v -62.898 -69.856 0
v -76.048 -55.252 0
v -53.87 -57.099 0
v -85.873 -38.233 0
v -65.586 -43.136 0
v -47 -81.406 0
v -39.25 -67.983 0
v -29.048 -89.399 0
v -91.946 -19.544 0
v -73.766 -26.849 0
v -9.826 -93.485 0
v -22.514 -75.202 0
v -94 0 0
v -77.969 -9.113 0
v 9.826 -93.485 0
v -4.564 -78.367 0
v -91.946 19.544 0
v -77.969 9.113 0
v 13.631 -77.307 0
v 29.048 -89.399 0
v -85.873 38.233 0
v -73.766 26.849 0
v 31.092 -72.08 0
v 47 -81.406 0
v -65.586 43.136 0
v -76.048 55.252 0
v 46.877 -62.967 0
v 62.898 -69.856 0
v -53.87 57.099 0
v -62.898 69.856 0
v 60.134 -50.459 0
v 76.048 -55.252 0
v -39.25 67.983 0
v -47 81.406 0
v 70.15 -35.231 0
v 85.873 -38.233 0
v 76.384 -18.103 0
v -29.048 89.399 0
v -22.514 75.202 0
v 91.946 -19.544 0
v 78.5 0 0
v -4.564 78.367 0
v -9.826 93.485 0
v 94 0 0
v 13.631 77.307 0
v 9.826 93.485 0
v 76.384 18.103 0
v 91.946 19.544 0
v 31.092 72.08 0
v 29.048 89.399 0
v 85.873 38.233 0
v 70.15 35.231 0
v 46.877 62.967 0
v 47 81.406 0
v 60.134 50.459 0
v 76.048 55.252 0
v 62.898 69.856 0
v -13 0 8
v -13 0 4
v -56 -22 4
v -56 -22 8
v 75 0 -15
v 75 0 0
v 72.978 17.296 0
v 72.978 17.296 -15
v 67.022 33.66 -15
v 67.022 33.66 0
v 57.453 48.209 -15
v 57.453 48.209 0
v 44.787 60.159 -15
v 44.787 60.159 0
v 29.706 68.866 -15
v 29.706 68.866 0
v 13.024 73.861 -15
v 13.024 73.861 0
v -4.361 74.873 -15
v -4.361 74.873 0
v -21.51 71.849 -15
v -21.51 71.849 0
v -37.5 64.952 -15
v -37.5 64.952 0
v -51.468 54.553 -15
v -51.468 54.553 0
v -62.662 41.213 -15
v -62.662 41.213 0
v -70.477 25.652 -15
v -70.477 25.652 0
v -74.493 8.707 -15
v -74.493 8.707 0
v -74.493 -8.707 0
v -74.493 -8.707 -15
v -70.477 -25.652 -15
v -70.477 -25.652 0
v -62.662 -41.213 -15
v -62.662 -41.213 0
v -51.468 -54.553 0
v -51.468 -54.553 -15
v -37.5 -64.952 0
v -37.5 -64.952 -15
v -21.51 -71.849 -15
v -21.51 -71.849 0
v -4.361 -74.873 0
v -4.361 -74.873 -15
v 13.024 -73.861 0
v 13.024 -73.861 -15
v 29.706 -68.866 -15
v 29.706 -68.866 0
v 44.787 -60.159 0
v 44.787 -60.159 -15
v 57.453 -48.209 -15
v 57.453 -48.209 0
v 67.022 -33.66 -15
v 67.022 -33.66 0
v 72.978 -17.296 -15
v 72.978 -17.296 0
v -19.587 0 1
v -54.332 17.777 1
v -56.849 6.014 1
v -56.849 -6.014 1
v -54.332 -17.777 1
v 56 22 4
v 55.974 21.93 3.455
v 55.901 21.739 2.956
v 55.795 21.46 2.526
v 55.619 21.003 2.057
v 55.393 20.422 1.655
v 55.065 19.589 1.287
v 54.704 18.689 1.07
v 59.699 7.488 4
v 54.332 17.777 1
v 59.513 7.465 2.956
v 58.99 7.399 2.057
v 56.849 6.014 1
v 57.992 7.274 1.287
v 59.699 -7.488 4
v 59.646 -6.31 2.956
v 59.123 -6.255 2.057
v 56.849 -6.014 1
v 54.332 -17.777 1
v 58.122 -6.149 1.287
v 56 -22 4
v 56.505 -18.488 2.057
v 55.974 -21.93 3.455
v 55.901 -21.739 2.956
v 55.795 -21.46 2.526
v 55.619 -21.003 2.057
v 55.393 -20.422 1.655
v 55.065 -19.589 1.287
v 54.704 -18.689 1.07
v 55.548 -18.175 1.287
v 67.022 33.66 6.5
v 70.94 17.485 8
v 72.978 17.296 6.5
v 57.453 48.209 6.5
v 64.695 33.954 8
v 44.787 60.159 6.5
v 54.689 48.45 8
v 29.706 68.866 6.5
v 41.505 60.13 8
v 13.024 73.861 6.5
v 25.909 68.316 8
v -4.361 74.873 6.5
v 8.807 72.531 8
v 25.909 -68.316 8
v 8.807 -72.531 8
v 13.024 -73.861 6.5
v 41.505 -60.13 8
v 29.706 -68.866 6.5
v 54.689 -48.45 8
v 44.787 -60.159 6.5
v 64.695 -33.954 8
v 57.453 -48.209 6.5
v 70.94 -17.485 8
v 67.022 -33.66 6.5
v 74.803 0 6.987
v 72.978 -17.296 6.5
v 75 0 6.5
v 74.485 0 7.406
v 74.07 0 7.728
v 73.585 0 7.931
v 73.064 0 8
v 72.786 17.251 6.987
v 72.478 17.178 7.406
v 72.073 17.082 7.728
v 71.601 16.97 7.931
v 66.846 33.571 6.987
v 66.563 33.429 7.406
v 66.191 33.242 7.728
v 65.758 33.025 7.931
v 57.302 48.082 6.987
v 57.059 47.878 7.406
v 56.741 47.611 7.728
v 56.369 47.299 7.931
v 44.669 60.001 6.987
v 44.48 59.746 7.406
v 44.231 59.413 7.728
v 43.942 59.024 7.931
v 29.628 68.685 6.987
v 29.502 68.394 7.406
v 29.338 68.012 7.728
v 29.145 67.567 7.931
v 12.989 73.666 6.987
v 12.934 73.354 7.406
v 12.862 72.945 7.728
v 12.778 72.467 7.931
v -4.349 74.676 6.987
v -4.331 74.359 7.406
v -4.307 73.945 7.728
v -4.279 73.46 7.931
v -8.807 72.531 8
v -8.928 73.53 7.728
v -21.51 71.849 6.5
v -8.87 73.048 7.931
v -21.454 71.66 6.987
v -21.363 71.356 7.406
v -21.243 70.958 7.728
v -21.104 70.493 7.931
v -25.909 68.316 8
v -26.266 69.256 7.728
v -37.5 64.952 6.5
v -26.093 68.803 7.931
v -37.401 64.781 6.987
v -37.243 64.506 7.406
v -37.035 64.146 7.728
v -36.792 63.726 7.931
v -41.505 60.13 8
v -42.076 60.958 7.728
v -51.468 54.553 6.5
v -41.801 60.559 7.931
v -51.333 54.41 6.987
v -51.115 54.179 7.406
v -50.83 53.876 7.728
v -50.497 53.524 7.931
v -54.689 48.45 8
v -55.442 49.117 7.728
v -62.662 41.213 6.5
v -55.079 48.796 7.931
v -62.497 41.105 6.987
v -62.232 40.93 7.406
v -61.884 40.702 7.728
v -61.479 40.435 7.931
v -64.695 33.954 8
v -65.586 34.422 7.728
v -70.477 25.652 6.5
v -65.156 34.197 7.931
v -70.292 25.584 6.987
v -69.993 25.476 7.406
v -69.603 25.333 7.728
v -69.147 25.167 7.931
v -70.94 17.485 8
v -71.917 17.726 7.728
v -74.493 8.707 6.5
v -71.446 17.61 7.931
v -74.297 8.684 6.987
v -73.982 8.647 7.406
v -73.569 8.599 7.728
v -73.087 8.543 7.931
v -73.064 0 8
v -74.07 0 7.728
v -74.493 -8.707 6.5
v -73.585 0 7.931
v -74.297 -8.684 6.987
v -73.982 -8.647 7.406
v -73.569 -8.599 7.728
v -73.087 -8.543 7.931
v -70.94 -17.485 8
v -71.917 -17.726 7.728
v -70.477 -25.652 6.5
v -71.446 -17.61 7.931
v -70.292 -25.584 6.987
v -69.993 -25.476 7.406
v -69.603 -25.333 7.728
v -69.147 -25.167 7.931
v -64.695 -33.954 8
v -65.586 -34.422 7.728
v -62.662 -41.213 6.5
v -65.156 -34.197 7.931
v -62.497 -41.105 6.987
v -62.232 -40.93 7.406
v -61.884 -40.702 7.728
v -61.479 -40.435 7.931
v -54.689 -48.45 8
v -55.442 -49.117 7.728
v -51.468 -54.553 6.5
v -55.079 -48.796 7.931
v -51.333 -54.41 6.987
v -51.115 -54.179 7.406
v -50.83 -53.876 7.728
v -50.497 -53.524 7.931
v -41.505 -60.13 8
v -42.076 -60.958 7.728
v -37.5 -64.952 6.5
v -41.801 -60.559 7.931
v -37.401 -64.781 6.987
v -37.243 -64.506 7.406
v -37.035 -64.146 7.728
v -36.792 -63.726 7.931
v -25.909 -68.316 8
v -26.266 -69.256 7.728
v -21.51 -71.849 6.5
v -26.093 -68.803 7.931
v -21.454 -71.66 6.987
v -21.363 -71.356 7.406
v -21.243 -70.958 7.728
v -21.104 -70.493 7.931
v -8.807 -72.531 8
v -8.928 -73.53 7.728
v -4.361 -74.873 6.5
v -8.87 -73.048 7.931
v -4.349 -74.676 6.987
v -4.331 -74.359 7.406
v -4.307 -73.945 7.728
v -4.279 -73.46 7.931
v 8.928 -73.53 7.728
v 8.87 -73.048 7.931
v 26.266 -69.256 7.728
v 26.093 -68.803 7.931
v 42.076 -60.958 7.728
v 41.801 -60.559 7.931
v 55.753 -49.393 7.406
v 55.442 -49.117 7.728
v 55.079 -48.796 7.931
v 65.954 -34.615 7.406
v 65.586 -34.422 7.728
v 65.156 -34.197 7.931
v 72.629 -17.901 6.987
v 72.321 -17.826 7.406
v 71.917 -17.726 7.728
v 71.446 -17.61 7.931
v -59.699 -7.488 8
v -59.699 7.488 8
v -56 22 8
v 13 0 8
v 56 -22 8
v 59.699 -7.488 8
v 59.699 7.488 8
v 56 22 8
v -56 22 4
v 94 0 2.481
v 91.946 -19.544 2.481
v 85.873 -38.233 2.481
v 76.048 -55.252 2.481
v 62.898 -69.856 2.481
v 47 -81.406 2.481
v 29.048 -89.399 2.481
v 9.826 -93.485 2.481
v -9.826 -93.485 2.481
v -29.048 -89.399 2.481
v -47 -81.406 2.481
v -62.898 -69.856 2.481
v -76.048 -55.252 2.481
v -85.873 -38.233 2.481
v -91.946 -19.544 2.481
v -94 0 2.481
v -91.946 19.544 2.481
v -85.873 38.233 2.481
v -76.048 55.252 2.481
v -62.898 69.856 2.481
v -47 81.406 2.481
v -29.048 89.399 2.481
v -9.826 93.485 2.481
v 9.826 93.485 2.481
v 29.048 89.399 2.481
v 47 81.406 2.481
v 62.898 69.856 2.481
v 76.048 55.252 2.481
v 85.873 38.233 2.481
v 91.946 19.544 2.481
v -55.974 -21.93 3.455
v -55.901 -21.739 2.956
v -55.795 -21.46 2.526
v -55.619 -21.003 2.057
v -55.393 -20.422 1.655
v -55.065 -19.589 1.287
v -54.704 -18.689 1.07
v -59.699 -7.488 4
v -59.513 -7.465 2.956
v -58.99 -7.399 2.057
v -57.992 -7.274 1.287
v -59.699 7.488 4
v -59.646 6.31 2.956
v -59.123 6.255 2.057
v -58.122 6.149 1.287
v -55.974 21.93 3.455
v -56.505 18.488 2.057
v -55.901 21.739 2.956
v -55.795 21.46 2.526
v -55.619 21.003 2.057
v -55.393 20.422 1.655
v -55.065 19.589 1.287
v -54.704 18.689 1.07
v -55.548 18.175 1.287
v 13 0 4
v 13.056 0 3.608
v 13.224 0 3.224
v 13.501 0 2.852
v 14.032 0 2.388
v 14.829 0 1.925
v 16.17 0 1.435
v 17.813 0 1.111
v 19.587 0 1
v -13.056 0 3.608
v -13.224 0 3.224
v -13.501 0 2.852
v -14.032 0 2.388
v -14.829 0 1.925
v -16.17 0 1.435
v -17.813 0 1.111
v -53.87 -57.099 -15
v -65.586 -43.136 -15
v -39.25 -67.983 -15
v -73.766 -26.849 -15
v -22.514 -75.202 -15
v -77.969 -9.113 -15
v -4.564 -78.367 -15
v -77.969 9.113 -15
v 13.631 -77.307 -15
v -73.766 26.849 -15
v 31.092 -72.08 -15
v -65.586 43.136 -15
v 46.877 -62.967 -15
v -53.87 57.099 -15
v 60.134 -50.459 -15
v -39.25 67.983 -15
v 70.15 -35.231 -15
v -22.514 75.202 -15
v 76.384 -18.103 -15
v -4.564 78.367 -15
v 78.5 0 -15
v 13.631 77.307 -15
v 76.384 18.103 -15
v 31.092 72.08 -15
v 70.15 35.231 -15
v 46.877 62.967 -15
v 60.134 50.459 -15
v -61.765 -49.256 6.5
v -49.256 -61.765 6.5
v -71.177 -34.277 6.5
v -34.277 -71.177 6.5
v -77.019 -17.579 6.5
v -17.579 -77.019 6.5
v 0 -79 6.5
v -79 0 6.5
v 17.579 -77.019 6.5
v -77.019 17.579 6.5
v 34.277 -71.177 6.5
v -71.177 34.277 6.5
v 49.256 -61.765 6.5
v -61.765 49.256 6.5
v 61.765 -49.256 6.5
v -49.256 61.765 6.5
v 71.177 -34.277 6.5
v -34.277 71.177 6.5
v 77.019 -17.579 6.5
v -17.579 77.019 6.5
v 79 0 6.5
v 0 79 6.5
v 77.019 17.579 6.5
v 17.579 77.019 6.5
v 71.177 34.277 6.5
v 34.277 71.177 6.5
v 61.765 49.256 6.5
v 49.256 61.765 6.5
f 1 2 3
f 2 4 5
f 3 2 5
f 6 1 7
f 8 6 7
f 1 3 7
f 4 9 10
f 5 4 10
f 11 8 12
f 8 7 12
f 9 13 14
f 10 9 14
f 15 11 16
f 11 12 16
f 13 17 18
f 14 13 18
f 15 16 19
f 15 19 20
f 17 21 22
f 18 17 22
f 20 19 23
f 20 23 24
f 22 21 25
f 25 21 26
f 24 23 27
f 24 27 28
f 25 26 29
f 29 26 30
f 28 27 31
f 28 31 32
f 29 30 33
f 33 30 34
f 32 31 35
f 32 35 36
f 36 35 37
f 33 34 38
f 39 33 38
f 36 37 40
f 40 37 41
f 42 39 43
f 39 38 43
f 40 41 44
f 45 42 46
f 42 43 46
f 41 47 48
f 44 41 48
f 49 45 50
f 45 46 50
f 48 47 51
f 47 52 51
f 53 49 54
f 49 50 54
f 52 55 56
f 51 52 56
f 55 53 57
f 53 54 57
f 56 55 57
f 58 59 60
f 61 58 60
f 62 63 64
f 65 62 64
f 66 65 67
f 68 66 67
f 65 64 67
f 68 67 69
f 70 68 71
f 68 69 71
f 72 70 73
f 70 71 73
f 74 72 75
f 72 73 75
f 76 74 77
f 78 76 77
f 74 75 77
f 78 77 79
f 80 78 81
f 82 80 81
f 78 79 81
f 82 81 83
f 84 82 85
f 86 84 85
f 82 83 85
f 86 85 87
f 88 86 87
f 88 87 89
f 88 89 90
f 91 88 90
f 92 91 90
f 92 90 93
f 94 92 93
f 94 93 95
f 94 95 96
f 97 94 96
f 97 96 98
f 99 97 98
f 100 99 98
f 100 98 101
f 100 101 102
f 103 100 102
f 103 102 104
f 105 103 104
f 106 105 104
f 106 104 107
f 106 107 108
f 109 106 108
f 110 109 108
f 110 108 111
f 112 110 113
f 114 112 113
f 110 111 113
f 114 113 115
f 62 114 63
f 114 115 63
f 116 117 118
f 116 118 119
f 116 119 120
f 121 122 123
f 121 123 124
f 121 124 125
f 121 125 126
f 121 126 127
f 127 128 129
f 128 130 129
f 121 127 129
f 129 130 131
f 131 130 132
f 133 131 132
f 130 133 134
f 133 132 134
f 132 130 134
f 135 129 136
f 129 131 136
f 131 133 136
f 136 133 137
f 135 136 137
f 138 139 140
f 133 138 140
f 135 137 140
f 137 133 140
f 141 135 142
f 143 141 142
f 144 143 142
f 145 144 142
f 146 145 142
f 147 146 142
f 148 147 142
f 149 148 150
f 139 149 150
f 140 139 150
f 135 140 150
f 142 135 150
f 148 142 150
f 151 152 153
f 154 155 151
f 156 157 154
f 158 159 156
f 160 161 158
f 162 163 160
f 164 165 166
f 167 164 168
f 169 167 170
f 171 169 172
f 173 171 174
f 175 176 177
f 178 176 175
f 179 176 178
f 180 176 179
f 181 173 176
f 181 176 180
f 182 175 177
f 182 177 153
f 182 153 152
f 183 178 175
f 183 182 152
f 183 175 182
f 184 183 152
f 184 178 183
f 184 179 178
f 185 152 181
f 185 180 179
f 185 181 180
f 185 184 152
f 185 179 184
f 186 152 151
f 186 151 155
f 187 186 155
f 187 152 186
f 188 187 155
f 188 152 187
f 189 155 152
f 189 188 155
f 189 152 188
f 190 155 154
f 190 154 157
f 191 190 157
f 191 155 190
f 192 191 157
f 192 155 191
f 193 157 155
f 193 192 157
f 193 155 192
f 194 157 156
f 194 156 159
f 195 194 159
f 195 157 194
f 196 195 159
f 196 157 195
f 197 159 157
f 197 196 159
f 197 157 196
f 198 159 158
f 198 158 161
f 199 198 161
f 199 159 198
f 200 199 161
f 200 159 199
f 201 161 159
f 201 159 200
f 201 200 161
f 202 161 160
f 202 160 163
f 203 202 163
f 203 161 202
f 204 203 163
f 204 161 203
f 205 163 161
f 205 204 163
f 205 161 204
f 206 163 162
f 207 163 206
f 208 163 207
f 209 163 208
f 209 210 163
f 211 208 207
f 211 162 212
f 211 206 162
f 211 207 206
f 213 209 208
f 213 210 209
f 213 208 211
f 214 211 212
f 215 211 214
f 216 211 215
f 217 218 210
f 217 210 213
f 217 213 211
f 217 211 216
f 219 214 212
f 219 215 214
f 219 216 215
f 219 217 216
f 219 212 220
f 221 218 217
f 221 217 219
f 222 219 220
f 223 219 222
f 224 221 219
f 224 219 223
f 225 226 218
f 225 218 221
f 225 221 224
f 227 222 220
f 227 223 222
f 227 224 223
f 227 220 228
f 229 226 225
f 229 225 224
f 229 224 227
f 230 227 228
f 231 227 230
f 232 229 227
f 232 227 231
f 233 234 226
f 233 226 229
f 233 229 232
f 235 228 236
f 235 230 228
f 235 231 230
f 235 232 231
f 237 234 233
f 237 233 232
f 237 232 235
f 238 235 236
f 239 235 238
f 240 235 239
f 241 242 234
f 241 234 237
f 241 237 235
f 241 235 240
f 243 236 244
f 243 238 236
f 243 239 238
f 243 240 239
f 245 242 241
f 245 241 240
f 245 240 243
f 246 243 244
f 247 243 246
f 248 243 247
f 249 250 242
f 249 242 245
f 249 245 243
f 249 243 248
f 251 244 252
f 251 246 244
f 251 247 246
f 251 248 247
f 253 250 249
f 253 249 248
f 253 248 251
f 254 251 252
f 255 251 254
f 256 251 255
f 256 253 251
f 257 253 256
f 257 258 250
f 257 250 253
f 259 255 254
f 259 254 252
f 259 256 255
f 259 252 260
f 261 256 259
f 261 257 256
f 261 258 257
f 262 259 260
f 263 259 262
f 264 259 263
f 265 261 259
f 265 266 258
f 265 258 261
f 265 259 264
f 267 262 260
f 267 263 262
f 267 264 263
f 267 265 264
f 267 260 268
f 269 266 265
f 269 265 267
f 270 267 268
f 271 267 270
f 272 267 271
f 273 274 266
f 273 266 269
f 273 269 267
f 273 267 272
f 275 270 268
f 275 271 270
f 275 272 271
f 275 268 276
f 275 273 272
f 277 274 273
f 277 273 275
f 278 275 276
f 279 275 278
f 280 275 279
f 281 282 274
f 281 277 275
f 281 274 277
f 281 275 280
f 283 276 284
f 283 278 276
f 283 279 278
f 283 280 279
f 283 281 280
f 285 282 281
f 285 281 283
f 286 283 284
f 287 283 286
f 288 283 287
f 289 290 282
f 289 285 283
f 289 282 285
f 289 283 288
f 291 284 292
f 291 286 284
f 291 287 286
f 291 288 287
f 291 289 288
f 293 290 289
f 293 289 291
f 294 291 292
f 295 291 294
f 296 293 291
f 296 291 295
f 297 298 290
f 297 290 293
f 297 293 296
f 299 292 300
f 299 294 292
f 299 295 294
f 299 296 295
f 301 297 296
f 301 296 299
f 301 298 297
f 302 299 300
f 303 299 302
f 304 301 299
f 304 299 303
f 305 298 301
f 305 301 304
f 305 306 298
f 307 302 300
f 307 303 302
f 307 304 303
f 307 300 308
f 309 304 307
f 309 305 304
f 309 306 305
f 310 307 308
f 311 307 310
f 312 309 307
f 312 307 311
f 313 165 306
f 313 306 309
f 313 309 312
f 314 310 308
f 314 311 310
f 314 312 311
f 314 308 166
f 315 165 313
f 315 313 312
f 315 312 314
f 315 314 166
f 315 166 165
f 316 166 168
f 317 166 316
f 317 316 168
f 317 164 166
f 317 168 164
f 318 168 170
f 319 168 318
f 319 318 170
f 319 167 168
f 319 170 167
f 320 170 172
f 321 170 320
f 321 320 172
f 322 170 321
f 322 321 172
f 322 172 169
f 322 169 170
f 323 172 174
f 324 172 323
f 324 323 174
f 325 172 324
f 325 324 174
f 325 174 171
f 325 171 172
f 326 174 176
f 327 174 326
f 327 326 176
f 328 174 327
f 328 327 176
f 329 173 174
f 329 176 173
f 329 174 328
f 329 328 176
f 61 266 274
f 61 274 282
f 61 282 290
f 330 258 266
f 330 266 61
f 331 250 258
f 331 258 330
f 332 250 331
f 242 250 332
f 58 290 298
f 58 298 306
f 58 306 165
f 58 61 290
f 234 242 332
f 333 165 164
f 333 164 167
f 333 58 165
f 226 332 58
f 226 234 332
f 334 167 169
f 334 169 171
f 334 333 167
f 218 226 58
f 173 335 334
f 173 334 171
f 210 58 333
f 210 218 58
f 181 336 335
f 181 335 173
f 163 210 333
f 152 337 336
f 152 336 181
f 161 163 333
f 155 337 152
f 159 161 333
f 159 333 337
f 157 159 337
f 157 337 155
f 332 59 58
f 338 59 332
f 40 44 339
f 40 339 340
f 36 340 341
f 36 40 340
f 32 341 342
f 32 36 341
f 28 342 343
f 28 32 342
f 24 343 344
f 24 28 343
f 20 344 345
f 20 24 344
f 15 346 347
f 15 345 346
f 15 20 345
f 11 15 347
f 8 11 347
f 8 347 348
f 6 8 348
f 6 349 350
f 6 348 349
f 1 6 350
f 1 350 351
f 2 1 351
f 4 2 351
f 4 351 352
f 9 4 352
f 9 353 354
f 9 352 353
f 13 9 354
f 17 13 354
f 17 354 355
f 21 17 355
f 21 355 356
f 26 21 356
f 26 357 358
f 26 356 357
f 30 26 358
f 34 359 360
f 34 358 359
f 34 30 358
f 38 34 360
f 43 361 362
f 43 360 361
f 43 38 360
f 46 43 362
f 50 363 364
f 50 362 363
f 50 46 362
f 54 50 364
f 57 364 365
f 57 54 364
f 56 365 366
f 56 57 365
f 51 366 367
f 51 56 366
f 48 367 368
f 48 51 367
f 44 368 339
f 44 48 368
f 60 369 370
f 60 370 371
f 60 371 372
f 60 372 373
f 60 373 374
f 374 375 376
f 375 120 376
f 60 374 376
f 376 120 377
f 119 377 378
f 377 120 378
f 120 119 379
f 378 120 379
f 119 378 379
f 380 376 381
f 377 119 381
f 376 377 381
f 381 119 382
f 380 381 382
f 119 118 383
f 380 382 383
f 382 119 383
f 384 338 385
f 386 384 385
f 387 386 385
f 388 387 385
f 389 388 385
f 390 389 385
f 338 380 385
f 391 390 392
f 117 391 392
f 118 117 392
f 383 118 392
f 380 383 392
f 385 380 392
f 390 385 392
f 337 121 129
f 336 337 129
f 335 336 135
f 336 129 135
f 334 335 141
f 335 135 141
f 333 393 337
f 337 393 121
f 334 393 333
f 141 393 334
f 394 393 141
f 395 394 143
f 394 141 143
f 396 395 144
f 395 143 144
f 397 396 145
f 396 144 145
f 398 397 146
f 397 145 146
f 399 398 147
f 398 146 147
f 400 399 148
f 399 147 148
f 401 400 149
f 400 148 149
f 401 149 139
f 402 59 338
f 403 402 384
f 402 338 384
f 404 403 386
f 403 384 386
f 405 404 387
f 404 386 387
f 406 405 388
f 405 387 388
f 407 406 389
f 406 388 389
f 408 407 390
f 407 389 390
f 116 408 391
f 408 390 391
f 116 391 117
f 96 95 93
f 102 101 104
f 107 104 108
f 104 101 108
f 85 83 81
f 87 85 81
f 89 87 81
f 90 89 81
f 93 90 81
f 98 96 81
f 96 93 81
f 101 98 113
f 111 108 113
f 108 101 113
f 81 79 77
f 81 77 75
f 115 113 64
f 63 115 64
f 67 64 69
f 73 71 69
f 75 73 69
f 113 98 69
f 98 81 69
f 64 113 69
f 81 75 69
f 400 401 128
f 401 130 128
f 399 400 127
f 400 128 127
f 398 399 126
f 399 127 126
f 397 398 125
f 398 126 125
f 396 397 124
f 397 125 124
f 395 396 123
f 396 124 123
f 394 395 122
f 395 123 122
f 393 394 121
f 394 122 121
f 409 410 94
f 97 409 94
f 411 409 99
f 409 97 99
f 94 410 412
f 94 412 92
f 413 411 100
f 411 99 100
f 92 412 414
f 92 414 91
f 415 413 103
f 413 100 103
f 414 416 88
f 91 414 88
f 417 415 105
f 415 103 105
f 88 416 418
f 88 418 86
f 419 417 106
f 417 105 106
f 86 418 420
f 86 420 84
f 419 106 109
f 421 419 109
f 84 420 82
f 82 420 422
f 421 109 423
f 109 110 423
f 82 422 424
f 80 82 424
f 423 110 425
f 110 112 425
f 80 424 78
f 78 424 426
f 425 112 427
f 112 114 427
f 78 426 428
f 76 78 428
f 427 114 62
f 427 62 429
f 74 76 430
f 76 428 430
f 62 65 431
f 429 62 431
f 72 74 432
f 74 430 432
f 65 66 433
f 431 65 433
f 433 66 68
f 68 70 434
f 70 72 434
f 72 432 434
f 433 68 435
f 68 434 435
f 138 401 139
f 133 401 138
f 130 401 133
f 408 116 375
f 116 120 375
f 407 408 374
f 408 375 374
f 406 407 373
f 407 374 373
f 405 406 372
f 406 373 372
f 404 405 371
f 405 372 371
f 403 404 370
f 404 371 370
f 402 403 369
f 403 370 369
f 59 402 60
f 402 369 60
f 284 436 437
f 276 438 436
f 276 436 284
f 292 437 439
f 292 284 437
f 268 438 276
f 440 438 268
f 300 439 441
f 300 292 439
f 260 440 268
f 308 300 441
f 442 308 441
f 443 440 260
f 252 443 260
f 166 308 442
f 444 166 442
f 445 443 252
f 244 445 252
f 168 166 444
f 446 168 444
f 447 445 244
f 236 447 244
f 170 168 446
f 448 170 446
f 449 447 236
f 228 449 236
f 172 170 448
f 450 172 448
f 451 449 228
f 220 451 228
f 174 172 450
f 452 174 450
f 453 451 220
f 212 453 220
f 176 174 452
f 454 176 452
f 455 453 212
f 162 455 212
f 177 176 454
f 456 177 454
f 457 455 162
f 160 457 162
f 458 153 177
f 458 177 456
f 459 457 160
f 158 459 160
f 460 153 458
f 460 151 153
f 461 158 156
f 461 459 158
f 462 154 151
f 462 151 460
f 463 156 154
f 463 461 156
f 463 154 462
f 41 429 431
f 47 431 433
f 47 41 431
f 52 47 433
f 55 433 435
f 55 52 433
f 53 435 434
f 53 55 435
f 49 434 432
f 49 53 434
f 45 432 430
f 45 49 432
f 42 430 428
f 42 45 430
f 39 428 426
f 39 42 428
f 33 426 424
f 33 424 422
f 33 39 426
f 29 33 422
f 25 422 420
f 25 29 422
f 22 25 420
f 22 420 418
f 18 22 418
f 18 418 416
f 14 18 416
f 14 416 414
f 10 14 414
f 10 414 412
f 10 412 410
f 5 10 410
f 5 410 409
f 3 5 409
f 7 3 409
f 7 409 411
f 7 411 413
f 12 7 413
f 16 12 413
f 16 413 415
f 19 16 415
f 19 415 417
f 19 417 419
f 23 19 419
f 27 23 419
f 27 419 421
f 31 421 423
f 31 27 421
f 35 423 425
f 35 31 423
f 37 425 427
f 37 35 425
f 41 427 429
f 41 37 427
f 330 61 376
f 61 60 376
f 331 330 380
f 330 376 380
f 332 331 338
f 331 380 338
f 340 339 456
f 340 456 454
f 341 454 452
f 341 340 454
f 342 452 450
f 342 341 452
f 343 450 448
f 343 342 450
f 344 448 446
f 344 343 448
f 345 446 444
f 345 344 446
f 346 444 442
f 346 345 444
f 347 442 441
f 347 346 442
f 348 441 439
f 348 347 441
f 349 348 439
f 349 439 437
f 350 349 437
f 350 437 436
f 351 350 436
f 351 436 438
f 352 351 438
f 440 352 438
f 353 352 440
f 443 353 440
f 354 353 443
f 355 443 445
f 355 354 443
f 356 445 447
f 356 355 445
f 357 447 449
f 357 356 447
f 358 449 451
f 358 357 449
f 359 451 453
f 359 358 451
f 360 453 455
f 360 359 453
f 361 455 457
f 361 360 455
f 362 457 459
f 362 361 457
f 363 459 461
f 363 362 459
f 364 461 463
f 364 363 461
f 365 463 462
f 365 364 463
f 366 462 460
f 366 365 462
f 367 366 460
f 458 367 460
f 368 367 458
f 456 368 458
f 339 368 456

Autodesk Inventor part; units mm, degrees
ref_plane "YZ Plane" through (0, 0, 0) normal (1, 0, 0) x (0, 1, 0)
ref_plane "XZ Plane" through (0, 0, 0) normal (0, 1, 0) x (-1, 0, 0)
ref_plane "XY Plane" through (0, 0, 0) normal (0, 0, 1) x (1, 0, 0)
sketch "Sketch1" plane through (0, 0, 0) normal (0, 0, 1) x (1, 0, 0)
  circle A0 centre (0, 0) radius 94
  circle A1 centre (0, 0) radius 75
  line L0 (-13, 0) -> (-56, 22)
  line L1 (-130, 0) -> (137, 0) construction
  line L2 (0, 131.4545) -> (0, -117) construction
  line L3 (-13, 0) -> (-56, -22)
  line L4 (0, -131.4545) -> (0, 117) construction
  arc A2 (-56, 22) -> (-56, -22) centre (0, 0) ccw
  line L5 (13, 0) -> (56, 22)
  line L6 (13, 0) -> (56, -22)
  arc A3 (56, -22) -> (56, 22) centre (0, 0) ccw
  circle A4 centre (0, 0) radius 78.5
  dimension "d0" = 188
  dimension "d6" = 150
  dimension "d16" = 157
extrude "Extrusion1" add sketch "Sketch1" along normal blind 6.5 contours A0 | A4
extrude "Extrusion3" add sketch "Sketch1" along normal blind 8 contours A1
fillet "Fillet2" radius 2 1 edges at (-75, 0, 8)
chamfer "Chamfer1" distance 15 angle 15 1 edges at (-94, 0, 6.5) measured on face at (-71.1692, 50.8207, 6.5)
extrude "Extrusion4" add sketch "Sketch1" along normal blind 1 contours L3 A2 L0 | L5 A3 L6
fillet "Fillet3" radius 3 6 edges at (-60.1664, 0, 1) (-34.5, 11, 1) (-34.5, -11, 1) (34.5, 11, 1) (34.5, -11, 1) (60.1664, 0, 1)
extrude "Extrusion5" add sketch "Sketch1" against normal blind 15 contours A4
properties part number "hatch"
